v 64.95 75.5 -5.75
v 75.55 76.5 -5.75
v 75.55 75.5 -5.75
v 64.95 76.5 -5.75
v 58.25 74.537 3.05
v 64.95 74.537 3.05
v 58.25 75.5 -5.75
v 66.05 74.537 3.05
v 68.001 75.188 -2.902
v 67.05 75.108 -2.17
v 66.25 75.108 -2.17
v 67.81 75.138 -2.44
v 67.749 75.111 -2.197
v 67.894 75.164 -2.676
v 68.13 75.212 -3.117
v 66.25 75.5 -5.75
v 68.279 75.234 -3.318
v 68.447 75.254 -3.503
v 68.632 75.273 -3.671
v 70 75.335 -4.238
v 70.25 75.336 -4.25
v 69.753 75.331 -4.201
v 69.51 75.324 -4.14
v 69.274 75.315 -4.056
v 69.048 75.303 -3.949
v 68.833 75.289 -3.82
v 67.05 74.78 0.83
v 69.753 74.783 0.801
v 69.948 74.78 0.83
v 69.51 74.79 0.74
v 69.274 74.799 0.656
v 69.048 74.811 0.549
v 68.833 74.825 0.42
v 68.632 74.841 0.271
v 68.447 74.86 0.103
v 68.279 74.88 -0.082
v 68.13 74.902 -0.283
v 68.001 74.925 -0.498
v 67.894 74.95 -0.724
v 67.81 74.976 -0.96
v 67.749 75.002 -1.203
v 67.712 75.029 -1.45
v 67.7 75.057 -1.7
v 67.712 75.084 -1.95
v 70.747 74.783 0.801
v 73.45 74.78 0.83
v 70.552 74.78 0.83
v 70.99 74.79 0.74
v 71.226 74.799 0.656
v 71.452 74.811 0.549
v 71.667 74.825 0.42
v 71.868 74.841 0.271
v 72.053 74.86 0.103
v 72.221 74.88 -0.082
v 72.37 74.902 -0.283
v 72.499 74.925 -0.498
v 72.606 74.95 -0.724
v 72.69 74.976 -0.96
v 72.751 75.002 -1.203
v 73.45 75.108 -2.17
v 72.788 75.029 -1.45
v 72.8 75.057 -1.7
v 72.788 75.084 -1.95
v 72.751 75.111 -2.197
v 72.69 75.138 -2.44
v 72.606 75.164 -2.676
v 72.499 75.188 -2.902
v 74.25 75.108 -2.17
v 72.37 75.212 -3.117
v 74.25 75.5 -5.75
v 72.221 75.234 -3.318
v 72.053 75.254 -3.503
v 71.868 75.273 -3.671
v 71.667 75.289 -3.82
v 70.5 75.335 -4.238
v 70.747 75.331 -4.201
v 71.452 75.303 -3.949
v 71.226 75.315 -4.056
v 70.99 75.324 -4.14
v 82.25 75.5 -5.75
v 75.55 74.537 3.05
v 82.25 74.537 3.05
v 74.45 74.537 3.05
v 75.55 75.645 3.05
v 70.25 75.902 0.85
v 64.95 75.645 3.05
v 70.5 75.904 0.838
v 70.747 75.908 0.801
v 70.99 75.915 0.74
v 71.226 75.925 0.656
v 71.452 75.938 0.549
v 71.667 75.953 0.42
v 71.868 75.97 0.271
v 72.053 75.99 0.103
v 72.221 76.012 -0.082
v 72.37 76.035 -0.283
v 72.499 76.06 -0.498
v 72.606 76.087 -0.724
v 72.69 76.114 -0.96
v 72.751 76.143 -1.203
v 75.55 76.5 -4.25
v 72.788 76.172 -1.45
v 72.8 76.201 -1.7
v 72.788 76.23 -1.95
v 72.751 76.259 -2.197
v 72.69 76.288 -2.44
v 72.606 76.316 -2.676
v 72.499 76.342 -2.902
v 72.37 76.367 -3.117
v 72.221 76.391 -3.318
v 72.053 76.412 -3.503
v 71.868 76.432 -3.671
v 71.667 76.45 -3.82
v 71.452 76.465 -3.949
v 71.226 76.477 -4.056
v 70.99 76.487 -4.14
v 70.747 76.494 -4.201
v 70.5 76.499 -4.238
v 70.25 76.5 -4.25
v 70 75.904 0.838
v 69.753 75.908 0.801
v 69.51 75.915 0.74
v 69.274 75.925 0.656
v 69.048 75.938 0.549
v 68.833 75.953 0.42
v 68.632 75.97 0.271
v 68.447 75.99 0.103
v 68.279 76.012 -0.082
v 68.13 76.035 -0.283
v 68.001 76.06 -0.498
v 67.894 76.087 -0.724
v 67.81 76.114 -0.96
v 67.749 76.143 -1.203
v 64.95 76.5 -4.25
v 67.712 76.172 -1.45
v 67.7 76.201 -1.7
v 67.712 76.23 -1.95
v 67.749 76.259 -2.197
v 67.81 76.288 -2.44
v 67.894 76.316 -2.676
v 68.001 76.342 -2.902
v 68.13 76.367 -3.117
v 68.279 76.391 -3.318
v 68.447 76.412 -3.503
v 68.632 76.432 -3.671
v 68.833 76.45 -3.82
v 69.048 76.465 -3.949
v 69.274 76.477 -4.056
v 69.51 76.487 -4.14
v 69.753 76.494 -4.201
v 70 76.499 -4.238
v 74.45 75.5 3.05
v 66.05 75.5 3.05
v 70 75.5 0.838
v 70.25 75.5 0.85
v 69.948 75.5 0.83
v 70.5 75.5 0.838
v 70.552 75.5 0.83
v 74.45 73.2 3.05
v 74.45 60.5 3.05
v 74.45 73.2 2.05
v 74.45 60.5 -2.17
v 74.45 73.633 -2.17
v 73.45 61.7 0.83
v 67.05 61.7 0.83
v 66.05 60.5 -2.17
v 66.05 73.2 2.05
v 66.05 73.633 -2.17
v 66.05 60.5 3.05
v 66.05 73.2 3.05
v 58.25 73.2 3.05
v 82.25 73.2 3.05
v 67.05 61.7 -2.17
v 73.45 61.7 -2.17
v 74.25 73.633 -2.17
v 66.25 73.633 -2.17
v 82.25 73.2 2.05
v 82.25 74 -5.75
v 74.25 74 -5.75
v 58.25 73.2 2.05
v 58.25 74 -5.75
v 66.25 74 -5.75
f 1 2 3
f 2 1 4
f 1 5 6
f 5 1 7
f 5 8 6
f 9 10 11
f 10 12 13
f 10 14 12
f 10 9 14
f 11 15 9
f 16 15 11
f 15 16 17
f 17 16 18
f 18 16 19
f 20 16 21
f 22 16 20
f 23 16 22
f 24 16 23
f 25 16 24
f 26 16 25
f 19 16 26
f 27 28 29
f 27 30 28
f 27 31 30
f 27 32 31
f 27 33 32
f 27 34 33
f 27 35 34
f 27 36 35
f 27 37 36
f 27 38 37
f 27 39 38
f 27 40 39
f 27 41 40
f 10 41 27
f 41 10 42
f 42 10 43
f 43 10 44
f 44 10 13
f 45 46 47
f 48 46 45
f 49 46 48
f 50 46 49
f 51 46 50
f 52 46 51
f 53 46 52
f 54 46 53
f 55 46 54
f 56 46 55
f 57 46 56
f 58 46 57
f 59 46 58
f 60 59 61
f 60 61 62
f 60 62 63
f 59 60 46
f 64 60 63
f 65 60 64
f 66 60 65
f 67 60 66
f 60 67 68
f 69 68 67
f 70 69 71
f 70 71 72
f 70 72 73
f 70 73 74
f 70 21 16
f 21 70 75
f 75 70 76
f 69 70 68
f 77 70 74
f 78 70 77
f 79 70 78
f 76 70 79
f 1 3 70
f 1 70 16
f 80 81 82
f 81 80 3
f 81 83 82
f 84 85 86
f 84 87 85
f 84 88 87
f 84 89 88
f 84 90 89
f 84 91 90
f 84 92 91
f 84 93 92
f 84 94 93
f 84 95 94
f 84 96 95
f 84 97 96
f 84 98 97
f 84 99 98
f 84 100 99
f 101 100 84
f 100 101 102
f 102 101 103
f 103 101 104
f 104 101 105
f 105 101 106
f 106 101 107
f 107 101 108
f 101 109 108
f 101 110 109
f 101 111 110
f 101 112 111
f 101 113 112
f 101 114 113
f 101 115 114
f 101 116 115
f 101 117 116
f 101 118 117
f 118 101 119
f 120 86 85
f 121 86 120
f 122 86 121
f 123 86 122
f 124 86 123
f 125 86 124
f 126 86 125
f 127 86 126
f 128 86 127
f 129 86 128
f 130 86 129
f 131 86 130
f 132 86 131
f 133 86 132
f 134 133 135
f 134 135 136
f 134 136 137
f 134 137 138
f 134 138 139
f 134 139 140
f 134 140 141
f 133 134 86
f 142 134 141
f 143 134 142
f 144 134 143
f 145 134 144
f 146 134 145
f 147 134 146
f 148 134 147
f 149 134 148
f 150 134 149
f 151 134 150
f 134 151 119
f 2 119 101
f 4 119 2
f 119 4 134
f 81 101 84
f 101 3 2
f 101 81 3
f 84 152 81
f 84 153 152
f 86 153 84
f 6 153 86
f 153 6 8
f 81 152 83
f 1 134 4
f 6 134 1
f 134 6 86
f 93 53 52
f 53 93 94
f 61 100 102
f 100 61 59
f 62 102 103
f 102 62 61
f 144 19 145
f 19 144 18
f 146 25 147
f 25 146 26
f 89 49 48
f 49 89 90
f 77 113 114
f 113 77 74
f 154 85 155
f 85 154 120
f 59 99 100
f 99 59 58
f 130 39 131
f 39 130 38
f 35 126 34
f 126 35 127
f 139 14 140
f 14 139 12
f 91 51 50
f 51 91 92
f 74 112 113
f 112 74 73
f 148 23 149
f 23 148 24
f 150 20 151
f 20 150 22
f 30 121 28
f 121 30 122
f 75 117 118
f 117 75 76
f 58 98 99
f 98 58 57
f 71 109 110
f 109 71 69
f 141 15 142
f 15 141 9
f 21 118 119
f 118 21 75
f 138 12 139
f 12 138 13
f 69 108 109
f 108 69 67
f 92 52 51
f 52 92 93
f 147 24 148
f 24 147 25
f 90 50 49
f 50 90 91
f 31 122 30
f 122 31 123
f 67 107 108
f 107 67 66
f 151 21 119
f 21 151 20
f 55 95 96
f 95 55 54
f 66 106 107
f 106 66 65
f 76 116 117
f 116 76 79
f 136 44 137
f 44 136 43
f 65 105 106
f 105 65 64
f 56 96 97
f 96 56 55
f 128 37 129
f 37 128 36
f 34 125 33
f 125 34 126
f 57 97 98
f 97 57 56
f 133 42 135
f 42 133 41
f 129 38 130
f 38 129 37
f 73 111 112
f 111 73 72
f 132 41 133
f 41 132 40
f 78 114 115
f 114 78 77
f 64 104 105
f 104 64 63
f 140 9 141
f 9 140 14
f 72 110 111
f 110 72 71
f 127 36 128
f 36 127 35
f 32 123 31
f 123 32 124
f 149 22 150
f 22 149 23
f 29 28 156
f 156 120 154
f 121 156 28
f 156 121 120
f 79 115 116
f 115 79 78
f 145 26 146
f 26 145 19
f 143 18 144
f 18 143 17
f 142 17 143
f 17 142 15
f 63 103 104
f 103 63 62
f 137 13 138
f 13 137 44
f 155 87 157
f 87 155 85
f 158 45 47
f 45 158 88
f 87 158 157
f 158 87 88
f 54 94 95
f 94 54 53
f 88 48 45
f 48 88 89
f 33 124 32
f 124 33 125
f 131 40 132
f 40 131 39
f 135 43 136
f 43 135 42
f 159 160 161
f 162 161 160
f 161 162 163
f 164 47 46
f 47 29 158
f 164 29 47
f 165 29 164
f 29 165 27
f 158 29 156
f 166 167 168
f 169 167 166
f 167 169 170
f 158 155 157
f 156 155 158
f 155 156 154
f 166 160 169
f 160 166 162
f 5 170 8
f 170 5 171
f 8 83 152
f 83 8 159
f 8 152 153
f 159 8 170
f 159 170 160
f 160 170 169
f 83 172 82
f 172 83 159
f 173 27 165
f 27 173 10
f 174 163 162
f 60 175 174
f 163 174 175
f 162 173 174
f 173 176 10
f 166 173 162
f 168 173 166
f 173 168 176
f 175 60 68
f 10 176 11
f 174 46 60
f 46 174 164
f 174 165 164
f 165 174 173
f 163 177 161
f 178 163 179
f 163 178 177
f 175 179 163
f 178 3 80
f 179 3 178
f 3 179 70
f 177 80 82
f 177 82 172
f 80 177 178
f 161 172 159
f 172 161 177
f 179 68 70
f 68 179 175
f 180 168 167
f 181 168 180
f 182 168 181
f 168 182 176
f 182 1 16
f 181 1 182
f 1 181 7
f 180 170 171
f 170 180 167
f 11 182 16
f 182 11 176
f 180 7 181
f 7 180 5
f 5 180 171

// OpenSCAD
kw=13.92; // size of hole for switch x
kd=14.42; // size of hole for switch y
sepx=19; // x spacing between the switches
sepy=20.6; // y spacing between the switches
th=1.5; // thickness of top
bth=1; // bottom thickness
gap=1.5; // x width of bits between keys

fingers = [0,0,15,24,19,19,19]; // controls y adjustment of columns
thumbs = [0,0,0,0,0,0,0];
dips = [0,0,0,1,1,0,0]; // controls z adjustment of columns
fronty=-33.5;  // y position of front
reary=76;      // y position of rear
supports = [fronty,-10,10,30,76];
edgex=2;


module rotate_about_xy(x, y, pt) {
  translate(pt)
    rotate([x, y, 0])
      translate(-pt)
        children();
}  

module rotate_about_z(z, pt) {
  translate(pt)
    rotate([0, 0, z])
      translate(-pt)
        children();
}  
module rotate_about_xy_off(x, y, pt,off) {
  translate(pt+off)
    rotate([x, y, 0])
      translate(-pt)
        children();
}  

bigR = 77;  // controls the radius of the curvature of the top. higher is less curve
rx = 2*asin(sepy/(2*bigR));
ry = 2*asin(sepx/(2*bigR));

// top plate

cubex=0.01;
cube2=cubex/2;
cubey=0.1;
vth=0.8;
baseline = -5; // controls where the bottom is and therefore overall height
frontdip=5; // height of bit at the front. higher numbers makes it lower
reardip=4;  // same at back
screw=6.1;

rotation_point = [0,0,bigR];
rot2 = 5; // how much the top is tilted forward
rot_point2 = [0,-30,2.7]; // the point forward tilt is around


module elitec() {
  color("green")cube([18.5,33.25,1.00],true);
//  color("silver")translate([0,(33.25/2)-(7.35/2)+0.65,1.65+0.5]) cube([9,7.35,3.3],true);
  color("silver") translate([0,(33.25/2)+0.65,1.65+0.5])
  difference() {
    hull() {
      translate([2.85,0,0]) rotate([90,0,0]) cylinder(d1=3.3,d2=3.3,h=7.35,$fn=32);
      translate([-2.85,0,0]) rotate([90,0,0]) cylinder(d1=3.3,d2=3.3,h=7.35,$fn=32);
    }
    hull() {
      translate([2.85,1,0]) rotate([90,0,0]) cylinder(d1=2.9,d2=2.9,h=7.35,$fn=32);
      translate([-2.85,1,0]) rotate([90,0,0]) cylinder(d1=2.9,d2=2.9,h=7.35,$fn=32);
    }
  }
  color("gray") translate([0,-2,1]) cube([8,8,1],true);
}

module elitec4() {
  difference() {
    color("green")translate([0,0,0.33]) cube([18.5,33.25,1.66],true);
    translate([0,13.13,0]) cube([9,7,1.67],true);
   
  }
//  color("silver")translate([0,(33.25/2)-(7.35/2)+0.65,1.65+0.5]) cube([9,7.35,3.3],true);
  color("silver") translate([0,(33.25/2)+0.65,1.16])
  difference() {
    hull() {
      translate([2.85,0,0]) rotate([90,0,0]) cylinder(d1=3.3,d2=3.3,h=7.35,$fn=32);
      translate([-2.85,0,0]) rotate([90,0,0]) cylinder(d1=3.3,d2=3.3,h=7.35,$fn=32);
    }
    hull() {
      translate([2.85,1,0]) rotate([90,0,0]) cylinder(d1=2.9,d2=2.9,h=7.35,$fn=32);
      translate([-2.85,1,0]) rotate([90,0,0]) cylinder(d1=2.9,d2=2.9,h=7.35,$fn=32);
    }
  }
  color("gray") translate([0,-2,1]) cube([8,8,1],true);
 
}

module pro_micro_caddy() {
  difference() {
    intersection() {
      color("limegreen")hull() {
       // top left
       translate([-10,fingers[3]+3,-dips[3]-reardip]) rotate_about_xy(rot2,0,rot_point2) rotate_about_xy(rx*3-rx/2,0,rotation_point) cube([cubex, cubey, th],true);
       // top right
       translate([30,fingers[3]+3,-dips[3]-reardip]) rotate_about_xy(rot2,0,rot_point2) rotate_about_xy(rx*3-rx/2,0,rotation_point) cube([cubex, cubey, th],true);
       // bottom left
       translate([-10,reary,baseline]) cube([cubex, 1, th],true);
       // bottom right
       translate([30,reary,baseline]) cube([cubex, 1, th],true);
     }
     translate([10,17.2+58+1,-3.5+1.75-0.2]) cube([20.7,5,10],true); // back plate
   }
   // hole for usb cable plug
    translate([10,78,-2.95]) hull() {
      translate([2.85,0,0]) rotate([90,0,0]) cylinder(d1=3.7,d2=3.7,h=7.35,$fn=32);
      translate([-2.85,0,0]) rotate([90,0,0]) cylinder(d1=3.7,d2=3.7,h=7.35,$fn=32);
    }
    // spacing for usb cable around the plug
    color("teal")translate([10,79,-2.95])rotate([90,90,0]) hull() {
      translate([0,2.95,0])cylinder(d1=7.3,d2=7.3,h=3,$fn=64);
      translate([0,-2.95,0])cylinder(d1=7.3,d2=7.3,h=3,$fn=64);
    }
  }
 
  // bit to glue caddy to case
  difference() {
    union() {
      hull() {
        translate([-4,75,-5.25]) cube([9,2,1],true);
        translate([-4,74,2.55]) cube([9,2,1],true);
      }
      hull() {
        translate([24,75,-5.25]) cube([9,2,1],true);
        translate([24,74,2.55]) cube([9,2,1],true);
      }
      translate([10,58,0.25]) {
        difference() {
          union() {
            translate([0,-0.4,1])color("lightblue")cube([21,34.8,1.00],true); // base
            translate([0,-0.4,2])color("lightcoral")cube([21,34.8,1.6],true); // base
          }
          translate([8,-0.4,0]) cube([3,32.8,3], true);
          translate([-8,-0.4,0]) cube([3,32.8,3], true);
          translate([0,-15.3,0]) cube([13.1,3,3], true);
        }
       
        // short walls
        color("orange")translate([10,0,-1]) cube([1,34,3],true);
        color("orange")translate([-10,0,-1]) cube([1,34,3],true);
        color("orange")translate([0,-17.3,-1]) cube([21,1,3],true);
      }
    }
    hull() {
       // top left
       translate([-10,fingers[3]+3,-dips[3]-reardip]) rotate_about_xy(rot2,0,rot_point2) rotate_about_xy(rx*3-rx/2,0,rotation_point) cube([cubex, cubey, th],true);
       // top right
       translate([30,fingers[3]+3,-dips[3]-reardip]) rotate_about_xy(rot2,0,rot_point2) rotate_about_xy(rx*3-rx/2,0,rotation_point) cube([cubex, cubey, th],true);
       // bottom left
       translate([-10,reary,baseline]) cube([cubex, 1, th],true);
       // bottom right
       translate([30,reary,baseline]) cube([cubex, 1, th],true);
     }
  }
}

// caddy to hold the elite c v4
module caddy1_v4() {
  difference() {
    intersection() {
      color("limegreen")hull() {
       // top left
       translate([-10,fingers[3]+3,-dips[3]-reardip]) rotate_about_xy(rot2,0,rot_point2) rotate_about_xy(rx*3-rx/2,0,rotation_point) cube([cubex, cubey, th],true);
       // top right
       translate([30,fingers[3]+3,-dips[3]-reardip]) rotate_about_xy(rot2,0,rot_point2) rotate_about_xy(rx*3-rx/2,0,rotation_point) cube([cubex, cubey, th],true);
       // bottom left
       translate([-10,reary,baseline]) cube([cubex, 1, th],true);
       // bottom right
       translate([30,reary,baseline]) cube([cubex, 1, th],true);
     }
     translate([10,17.2+58+1,-3.5+1.75-0.2]) cube([20.7,5,10],true); // back plate
   }
   // hole for usb cable plug
    translate([10,78,-1.95]) hull() {
      translate([2.85,0,0]) rotate([90,0,0]) cylinder(d1=3.7,d2=3.7,h=7.35,$fn=32);
      translate([-2.85,0,0]) rotate([90,0,0]) cylinder(d1=3.7,d2=3.7,h=7.35,$fn=32);
    }
    color("teal")translate([10,79,-1.95])rotate([90,90,0]) hull() {
      translate([0,2.95,0])cylinder(d1=7.3,d2=7.3,h=3,$fn=64);
      translate([0,-2.95,0])cylinder(d1=7.3,d2=7.3,h=3,$fn=64);
    }
  }
 
  // bit to glue caddy to case
  difference() {
    union() {
      //translate([24.5,74.6,-1.35]) rotate([5,0,0]) cube([10,2,9],true);
      //translate([-4,74.6,-1.35]) rotate([5,0,0]) cube([9,2,9],true);
      hull() {
        translate([-4,75,-5.25]) cube([9,2,1],true);
        translate([-4,74,2.55]) cube([9,2,1],true);
      }
      hull() {
        translate([24,75,-5.25]) cube([9,2,1],true);
        translate([24,74,2.55]) cube([9,2,1],true);
      }
      translate([10,58,-0.75]) {
        difference() {
          union() {
            translate([0,-0.4,1])color("lightblue")cube([21,34.8,1.00],true); // base
            translate([0,-0.4,2.65])color("lightcoral")cube([21,34.8,2.3],true); // base
          }
          translate([8,-0.4,0]) cube([3,32.8,3], true);
          translate([-8,-0.4,0]) cube([3,32.8,3], true);
          translate([0,-15.3,0]) cube([13.1,3,3], true);
        }
        // short walls
        color("orange")translate([10,0,-1]) cube([1,34,3],true);
        color("orange")translate([-10,0,-1]) cube([1,34,3],true);
        color("orange")translate([0,-17.3,-1]) cube([21,1,3],true);
      }
    }
    // backplate
    hull() {
       // top left
       translate([-10,fingers[3]+3,-dips[3]-reardip]) rotate_about_xy(rot2,0,rot_point2) rotate_about_xy(rx*3-rx/2,0,rotation_point) cube([cubex, cubey, th],true);
       // top right
       translate([30,fingers[3]+3,-dips[3]-reardip]) rotate_about_xy(rot2,0,rot_point2) rotate_about_xy(rx*3-rx/2,0,rotation_point) cube([cubex, cubey, th],true);
       // bottom left
       translate([-10,reary,baseline]) cube([cubex, 1, th],true);
       // bottom right
       translate([30,reary,baseline]) cube([cubex, 1, th],true);
     }
   
  }
}

// caddy for the trrs jack
module jack_caddy() {
  holex = 4.75*sepx-20;
  difference() {
    intersection() {
      color("seagreen")
      hull() {
        // top left
        translate([holex-8,fingers[3]+3,-dips[3]-reardip]) rotate_about_xy(rot2,0,rot_point2) rotate_about_xy(rx*3-rx/2,0,rotation_point) cube([cubex, cubey, th],true);
        // top right
        translate([holex+8,fingers[3]+3,-dips[3]-reardip]) rotate_about_xy(rot2,0,rot_point2) rotate_about_xy(rx*3-rx/2,0,rotation_point) cube([cubex, cubey, th],true);
        // bottom left
        translate([holex-8,reary,baseline]) cube([cubex, 1, th],true);
        // bottom right
        translate([holex+8,reary,baseline]) cube([cubex, 1, th],true);
      }
      translate([holex,17.2+58+1,-3.5+1.75-0.7]) cube([10.6,5,11],true); // back plate
    }
    translate([holex,78,-1.7]) rotate([90,0,0]) cylinder(d1=5.1,d2=5.1,h=4,$fn=64);
  }

  translate([holex,68,1.33]) {
    union(){
      color("orange") cube([8.4,15,1],true);
      color("skyblue") translate([0,0,1.1])cube([8.4,15,1.24],true);
      translate([-3.7,0,-1.5])cube([1,15,4],true);
      translate([3.7,0,-1.5])cube([1,15,4],true);
      translate([0,-6.9,-1.5])cube([8,1.2,4],true);
    }
  }
  difference(){
    union(){
      translate([holex,68,1.33]) {
        hull() {
          translate([8,6.2,-2.78+4]) cube([8,2,1],true);
          translate([8,7,baseline-1.58]) cube([8,2,1],true);
        }
        hull() {
          translate([-8,6.2,-2.78+4]) cube([8,2,1],true);
          translate([-8,7,baseline-1.58]) cube([8,2,1],true);
        }
      }
    }
    hull() {
      // top left
      translate([holex-16,fingers[3]+3,-dips[3]-reardip]) rotate_about_xy(rot2,0,rot_point2) rotate_about_xy(rx*3-rx/2,0,rotation_point) cube([cubex, cubey, th],true);
      // top right
      translate([holex+16,fingers[3]+3,-dips[3]-reardip]) rotate_about_xy(rot2,0,rot_point2) rotate_about_xy(rx*3-rx/2,0,rotation_point) cube([cubex, cubey, th],true);
      // bottom left
      translate([holex-16,reary,baseline]) cube([cubex, 1, th],true);
      // bottom right
      translate([holex+16,reary,baseline]) cube([cubex, 1, th],true);
    }
  }
 
}

// TRRS jack
module jack() {
  color("darkgray")
  translate([4.75*sepx-20,68,-1.7]) {
    rotate([-90,0,0]){
      difference() {
        union(){
          translate([0,0,6])cylinder(d1=5,d2=5,h=2,$fn=64);
          cube([6.25, 5.1, 12.2],true);
        }
        translate([0,0,-6]) cylinder(d1=3.5,d2=3.5,h=19,$fn=64);
      }
    }
  }
 
}


module usbc() {
  color("gray")hull() {
    // 12.6mm x 6.7
    translate([0,2.95,0])cylinder(d1=6.7,d2=6.7,h=24.5,$fn=64);
    translate([0,-2.95,0])cylinder(d1=6.7,d2=6.7,h=24.5,$fn=64);
  }
  color("silver")
  difference(){
    hull() {
    //2.5 x 8.3
      translate([0,2.9,24.5])cylinder(d1=2.5,d2=2.5,h=6.5,$fn=32);
      translate([0,-2.9,24.5])cylinder(d1=2.5,d2=2.5,h=6.5,$fn=32);
    }
    hull() {
      translate([0,2.9,24.5])cylinder(d1=2.2,d2=2.2,h=6.7,$fn=32);
      translate([0,-2.9,24.5])cylinder(d1=2.2,d2=2.2,h=6.7,$fn=32);
    }
  }
}
//translate([0,43.3,2]) rotate([90,90,0]) usbc();

module bolt(x,y) {
  boltx = 5.55;
  difference() {
    translate([x,y,baseline+1.5]) cube([8,7,4.5],true);
    //translate([x,y,baseline+4.8]) rotate([0,0,30]) color("red")import("C:/Users/Chris/Downloads/Metric_nuts_and_screws/files/hex_negative_m3.stl");
    for(i = [0:2]) {
      translate([x,y,baseline+4.8]) rotate([0,0,60*i+30])cube([boltx, tan(30)*boltx, 5],true);
    }
   
    translate([x,y,baseline-th]) cylinder(d1=3.2,d2=3.2,h=10,$fn=64);
  }

}

module m3screw(x,y) {
  translate([x,y,-6.9])
  difference() {
    union() {
      cylinder(d1=3, d2=3, h=6,$fn=64);
      cylinder(d1=5.9,d2=3,h=2,$fn=64);
    }
    cylinder(d1=2,d2=2,h=1,$fn=6);
  }
}
module m3screws() {
  m3screw(-sepx+4.9,fronty+4.2);
  //bolt(6*sepx-4.9,fronty+4.2);
 
  m3screw(-sepx+4.9,reary-4.2);
  m3screw(6*sepx-4.9,reary-4.2);
 
  m3screw(1.5*sepx,fronty+4.3);
  m3screw(3.5*sepx,reary-4.2);
  m3screw(6*sepx-4.9,-5);
 
  m3screw(-sepx+4.9,27);
 
}

module bolts() {
  bolt(-sepx+4.9,fronty+4.2);
  //bolt(6*sepx-4.9,fronty+4.2);
 
  bolt(-sepx+4.9,reary-4.2);
  bolt(5*sepx-4.9,reary-4.2);
 
  //bolt(1.5*sepx,fronty+4.3);
  bolt(2*sepx,reary-4.2);
  bolt(5*sepx-4.9,-7);
 
  bolt(-sepx+4.9,27);
}


module keycaps() {
 
  union() {
   
    for(n = [-1:2]) {
      for(m = [0:5]) {
        translate([m*sepx-sepx/2,fingers[m],-dips[m]])
           rotate_about_xy(rot2,0,rot_point2)
           rotate_about_xy(n*rx,0,[0,0,bigR])
             translate([0,0,10])rotate([90,0,0])import("C:/Users/Chris/Documents/DSA 1u.stl");
      }
    }
    for(m = [3:5]){
      translate([m*sepx-sepx/2,-2*sepy+thumbs[m],0])
        rotate_about_xy(rx,0,rotation_point)
          translate([0,0,10])rotate([90,0,0])import("C:/Users/Chris/Documents/DSA 1u.stl");
    }
  }
}

module top() {
//mirror(v=[1,0,0])
difference() {
union() {
  // 4 x 6 finger keys
  for (m = [0:5]) { // across the fingers
    p = m-1;
    for(n = [-1:2]){ // keyboard rows
      difference() {
        color("orange")hull() {
          left=m==0?-edgex:0;
          right=m==5?edgex:0;
          // back right
          translate([m*sepx-gap+right,fingers[m],-dips[m]]) rotate_about_xy(rot2,0,rot_point2) rotate_about_xy(rx*n+rx/2,0,rotation_point) cube([cubex, cubey, th],true);
          // front right
          translate([m*sepx-gap+right,fingers[m],-dips[m]]) rotate_about_xy(rot2,0,rot_point2)rotate_about_xy(rx*n-rx/2,0,rotation_point) cube([cubex, cubey, th],true);
          // back left
          translate([(m-1)*sepx+gap+left,fingers[m],-dips[m]]) rotate_about_xy(rot2,0,rot_point2)rotate_about_xy(rx*n+rx/2,0,rotation_point) cube([cubex, cubey, th],true);
          // front left
          translate([(m-1)*sepx+gap+left,fingers[m],-dips[m]]) rotate_about_xy(rot2,0,rot_point2)rotate_about_xy(rx*n-rx/2,0,rotation_point) cube([cubex, cubey, th],true);
        }
        if(m<6) { // cut out hole for keycap
          translate([m*sepx-sepx/2,fingers[m],-dips[m]])rotate_about_xy(rot2,0,rot_point2)rotate_about_xy(n*rx,0,rotation_point) cube([kw,kd,5],true);
        }
      }
      // vertical supports that go in the Y direction
      // that sit on the right side of the key plates
      if(m>4)
      color("wheat")hull() {
        // two bits on the underside of the keyboard plate
        translate([m*sepx-gap-vth+edgex,fingers[m],-dips[m]]) rotate_about_xy(rot2,0,rot_point2) rotate_about_xy_off(rx*n+rx/2,0,rotation_point,[0,0,-1]) cube([2*vth, cubey, th],true);
        translate([m*sepx-gap-vth+edgex,fingers[m],-dips[m]]) rotate_about_xy(rot2,0,rot_point2) rotate_about_xy_off(rx*n-rx/2,0,rotation_point,[0,0,-1]) cube([2*vth, cubey, th],true);
        // two vertices on the floor                for thicker walls vvvvv
        translate([m*sepx-gap-vth+edgex,supports[n+1],baseline])cube([2*vth, cubey, th],true);
        translate([m*sepx-gap-vth+edgex,supports[n+2],baseline])cube([2*vth, cubey, th],true);
      }
      // that sit on the left side of the key plates
      if (m<1)
      color("wheat") hull() { //
        // two bits on the underside of the keyboard plate
        translate([(m-1)*sepx+gap+vth-edgex,fingers[m],-dips[m]]) rotate_about_xy(rot2,0,rot_point2)rotate_about_xy_off(rx*n+rx/2,0,rotation_point,[0,0,-1]) cube([2*vth, cubey, th],true);
        translate([(m-1)*sepx+gap+vth-edgex,fingers[m],-dips[m]]) rotate_about_xy(rot2,0,rot_point2)rotate_about_xy_off(rx*n-rx/2,0,rotation_point,[0,0,-1]) cube([2*vth, cubey, th],true);
        // two vertices on the floor
        translate([(m-1)*sepx+gap+vth-edgex,supports[n+1],baseline])cube([2*vth, cubey, th],true);
        translate([(m-1)*sepx+gap+vth-edgex,supports[n+2],baseline])cube([2*vth, cubey, th],true);
      }


    }
  }

 
  for (m = [4:5]) {
    // thumb keys
    difference(){
     color("plum")hull() {
       left=m==0?-edgex:0;
       right=m==5?edgex:0;
       // top right
       translate([m*sepx-gap+right,-2*sepy+thumbs[m],0]) rotate_about_xy(rx+rx/2,0,rotation_point) cube([cubex, cubey, th],true);
       // bottom right
       translate([m*sepx-gap+right,-2*sepy+thumbs[m],0]) rotate_about_xy(rx-rx/2,0,rotation_point) cube([cubex, cubey, th],true);
       // top left
       translate([(m-1)*sepx+gap+left,-2*sepy+thumbs[m],0]) rotate_about_xy(rx+rx/2,0,rotation_point) cube([cubex, cubey, th],true);
       // bottom left
       translate([(m-1)*sepx+gap+left,-2*sepy+thumbs[m],0]) rotate_about_xy(rx-rx/2,0,rotation_point) cube([cubex, cubey, th],true);
     }
     // key hole
     translate([m*sepx-sepx/2,-2*sepy+thumbs[m],0]) rotate_about_xy(rx,0,rotation_point) cube([kw,kd,5],true);
    }
    // bits to join front of thumb keys to front line
    color("salmon")hull() {
       left=m==0?-edgex:0;
       right=m==5?edgex:0;
    // from plate
    // bottom right
    translate([m*sepx-gap+right,-2*sepy+thumbs[m],0]) rotate_about_xy(rx-rx/2,0,rotation_point) cube([cubex, cubey, th],true);
    // bottom left
    translate([(m-1)*sepx+gap+left,-2*sepy+thumbs[m],0]) rotate_about_xy(rx-rx/2,0,rotation_point) cube([cubex, cubey, th],true);
    // to line
    translate([(m-1)*sepx+gap+left,fingers[0]-3,-dips[3]-frontdip]) rotate_about_xy(rx*n-rx/2,0,rotation_point) cube([cubex, 1, th],true);
    translate([m*sepx-gap+right,fingers[0]-3,-dips[3]-frontdip]) rotate_about_xy(rx*n-rx/2,0,rotation_point) cube([cubex, 1, th],true);
   }
  }
  // bit to join left most thumb key to front bit of middle finger column
  for(m=[4:5]) {
   color("red")hull() {
      // back right
      translate([(m-1)*sepx+gap-cube2,-2*sepy+thumbs[m],0]) rotate_about_xy(rx+rx/2,0,rotation_point) cube([cubex, cubey, th],true);
      // front right
      translate([(m-1)*sepx+gap-cube2,-2*sepy+thumbs[m],0]) rotate_about_xy(rx-rx/2,0,rotation_point) cube([cubex, cubey, th],true);
      // mid left
      translate([(m-1)*sepx-gap+cube2,fingers[m-1],-dips[m-1]]) rotate_about_xy(rot2,0,rot_point2) rotate_about_xy(rx*n-rx/2,0,rotation_point) cube([cubex, cubey, th],true);
      // front left
      translate([(m-1)*sepx-gap+cube2,fingers[0]-3,-dips[3]-frontdip]) rotate_about_xy(rx*n-rx/2,0,rotation_point) cube([cubex, 1, th],true);
   }
   
   color("firebrick")hull() {
      // front left
      translate([(m-1)*sepx-gap+cube2,fingers[0]-3,-dips[3]-frontdip]) rotate_about_xy(rx*n-rx/2,0,rotation_point) cube([cubex, 1, th],true);
     // front right
     translate([(m-1)*sepx+gap-cube2,fingers[0]-3,-dips[3]-frontdip]) rotate_about_xy(rx*n-rx/2,0,rotation_point) cube([cubex, 1, th],true);
     // mid right
      translate([(m-1)*sepx+gap,-2*sepy+thumbs[m],0]) rotate_about_xy(rx-rx/2,0,rotation_point) cube([cubex, cubey, th],true);
   }
    // bit to fill a triangle hole between leftmost thumb, bottom row middle finger, & bottom row ring finger
   color("maroon")hull(){
     // back right
     translate([(m-1)*sepx+gap,fingers[m],-dips[m]]) rotate_about_xy(rot2,0,rot_point2)rotate_about_xy(rx*n-rx/2,0,rotation_point) cube([cubex, cubey, th],true);      
     // front left
      translate([(m-1)*sepx-gap,fingers[m-1],-dips[m-1]])rotate_about_xy(rot2,0,rot_point2)rotate_about_xy(rx*n-rx/2,0,rotation_point) cube([cubex, cubey, th],true);
     // mid right
      translate([(m-1)*sepx+gap,-2*sepy+thumbs[m],0]) rotate_about_xy(rx+rx/2,0,rotation_point) cube([cubex, cubey, th],true);
   }
  }
  for(m=[4:5]){
    // thumb vertical supports
    if(m>4)
     color("limegreen")hull() {
         left=m==0?-edgex:0;
         right=m==5?edgex:0;
       // top                                                                           2*vth for thicker walls vvvvv
       translate([m*sepx-gap-vth+right,-2*sepy+thumbs[m],-0.3]) rotate_about_xy(rx+rx/2,0,rotation_point) cube([2*vth, cubey, 0.1],true);
       translate([m*sepx-gap-vth+right,-2*sepy+thumbs[m],-0.3]) rotate_about_xy(rx-rx/2,0,rotation_point) cube([2*vth, cubey, 0.1],true);
       // floor
       translate([m*sepx-gap-vth+right,fronty,baseline])cube([2*vth, cubey, th],true);
       translate([m*sepx-gap-vth+right,-5,baseline])cube([2*vth, cubey, th],true);
       // front
       translate([m*sepx-gap-vth+right,fingers[0]-3,-dips[3]-frontdip]) rotate_about_xy(rx*n-rx/2,0,rotation_point) cube([2*vth, 1, 0.1],true);
     }

  }
  // connecting front line to baseline
  for(m=[0:5]) {
    color("lightpink")hull() {
     left=m==0?-edgex:0;
     right=m==5?edgex:0;
      // left
      translate([(m-1)*sepx+gap+left,fingers[0]-3,-dips[3]-frontdip]) rotate_about_xy(rx*n-rx/2,0,rotation_point) cube([cubex, 1, th],true);
      translate([(m-1)*sepx+gap+left,fronty,baseline]) cube([cubex, 1, th],true); // floor
      // right
      translate([m*sepx-gap+right,fingers[0]-3,-dips[3]-frontdip]) rotate_about_xy(rx*n-rx/2,0,rotation_point) cube([cubex, 1, th],true);
      translate([m*sepx-gap+right,fronty,baseline]) cube([cubex, 1, th],true); // floor
    }
    if(m<5) {
      color("PaleVioletRed")hull() {
      // left
      translate([m*sepx+gap,fingers[0]-3,-dips[3]-frontdip]) rotate_about_xy(rx*n-rx/2,0,rotation_point) cube([cubex, 1, th],true);
      translate([m*sepx+gap,fronty,baseline]) cube([cubex, 1, th],true); // floor
      // right
      translate([m*sepx-gap,fingers[0]-3,-dips[3]-frontdip]) rotate_about_xy(rx*n-rx/2,0,rotation_point) cube([cubex, 1, th],true);
      translate([m*sepx-gap,fronty,baseline]) cube([cubex, 1, th],true); // floor
      }
    }

    // vertical supports that go in the Y direction
    // that sit on the right side of the key plates
    // this bit joins the wheat vertical supports to the lightpink and palevioletred bit at the front
    for(n=[-1:-1]) {
      if(m>4)
      color("springgreen")hull() {
        right=m==5?edgex:0;
        // two bits on the underside of the keyboard plate
        // translate([(m-1)*sepx+gap+vth/2,fingers[m],-dips[m]]) rotate_about_xy(rot2,0,rot_point2)rotate_about_xy_off(rx*n+rx/2,0,rotation_point,[0,0,-1]) cube([vth, cubey, th],true);
        translate([m*sepx-gap-vth/2+right,fingers[m],-dips[m]]) rotate_about_xy(rot2,0,rot_point2)rotate_about_xy_off(rx*n-rx/2,0,rotation_point,[0,0,-1]) cube([vth, cubey, th],true);
        // two vertices on the floor
        translate([m*sepx-gap-vth/2+right,supports[n+1],baseline])cube([vth, cubey, th],true);
        // to line
        translate([m*sepx-gap-vth/2+right,fingers[0]-3,-dips[3]-frontdip]) rotate_about_xy(rx*n-rx/2,0,rotation_point) cube([vth, cubey, th],true);
      }
      // that sit on the left side of the key plates
      if(m<1)
      color("springgreen")hull() {
         left=m==0?-edgex:0;
        // two bits on the underside of the keyboard plate
        // translate([(m-1)*sepx+gap+vth/2,fingers[m],-dips[m]]) rotate_about_xy(rot2,0,rot_point2)rotate_about_xy_off(rx*n+rx/2,0,rotation_point,[0,0,-1]) cube([vth, cubey, th],true);
        translate([(m-1)*sepx+gap+vth+left,fingers[m],-dips[m]]) rotate_about_xy(rot2,0,rot_point2)rotate_about_xy_off(rx*n-rx/2,0,rotation_point,[0,0,-1]) cube([2*vth, cubey, th],true);
        // two vertices on the floor
        translate([(m-1)*sepx+gap+vth+left,fronty,baseline])cube([2*vth, cubey, th],true);
        // to line
        translate([(m-1)*sepx+gap+vth+left,fingers[0]-3,-dips[3]-frontdip]) rotate_about_xy(rx*n-rx/2,0,rotation_point) cube([2*vth, cubey, th],true);
      }
    }
  }
 
  //  bits between thumb keys
  for (m = [4:4]) {
   color("mediumorchid")hull() {
     // top left
     translate([m*sepx-gap+cube2,-2*sepy+thumbs[m],0]) rotate_about_xy(rx+rx/2,0,rotation_point) cube([cubex, cubey, th],true);
     // bottom left
     translate([m*sepx-gap+cube2,-2*sepy+thumbs[m],0]) rotate_about_xy(rx-rx/2,0,rotation_point) cube([cubex, cubey, th],true);
     // top right
     translate([m*sepx+gap-cube2,-2*sepy+thumbs[m],0]) rotate_about_xy(rx+rx/2,0,rotation_point) cube([cubex, cubey, th],true);
     // bottom right
     translate([m*sepx+gap-cube2,-2*sepy+thumbs[m],0]) rotate_about_xy(rx-rx/2,0,rotation_point) cube([cubex, cubey, th],true);
     //
   }
   hull() {
     // bottom right
     translate([m*sepx+gap-cube2,-2*sepy+thumbs[m],0]) rotate_about_xy(rx-rx/2,0,rotation_point) cube([cubex, cubey, th],true);
     // bottom left
     translate([m*sepx-gap+cube2,-2*sepy+thumbs[m],0]) rotate_about_xy(rx-rx/2,0,rotation_point) cube([cubex, cubey, th],true);
     // front right
     translate([m*sepx+gap-cube2,fingers[0]-3,-dips[3]-frontdip]) rotate_about_xy(rx*n-rx/2,0,rotation_point) cube([cubex, 1, th],true);
     // front left
     translate([m*sepx-gap+cube2,fingers[0]-3,-dips[3]-frontdip]) rotate_about_xy(rx*n-rx/2,0,rotation_point) cube([cubex, 1, th],true);
   }
  }
 
  // tiny little bit to join thumb inbetween bits with key inbetween bits
  n3=-1;
  for (m = [4:4]) {
    p = m+1;
   color("coral")hull() {
     // thumb
     translate([m*sepx-gap+cube2,-2*sepy+thumbs[m],0]) rotate_about_xy(rx+rx/2,0,rotation_point) cube([cubex, cubey, th],true);
     translate([m*sepx+gap-cube2,-2*sepy+thumbs[m],0]) rotate_about_xy(rx+rx/2,0,rotation_point) cube([cubex, cubey, th],true);
     // finger keys
     translate([m*sepx-gap+cube2,fingers[m],-dips[m]]) rotate_about_xy(rot2,0,rot_point2)rotate_about_xy(rx*n3-rx/2,0,rotation_point) cube([cubex, cubey, th],true);
     translate([m*sepx+gap-cube2,fingers[p],-dips[p]]) rotate_about_xy(rot2,0,rot_point2)rotate_about_xy(rx*n3-rx/2,0,rotation_point) cube([cubex, cubey, th],true);
   }
  }
 
 
  // joiners between keys
  for (m = [0:4]) { // across the fingers
    //m = 2;
    p = m+1;
    for(n = [-1:2]){ // keyboard rows
     color("hotpink")hull() {
       // top right
      translate([m*sepx-gap+cube2,fingers[m],-dips[m]]) rotate_about_xy(rot2,0,rot_point2) rotate_about_xy(rx*n+rx/2,0,rotation_point) cube([cubex, cubey, th],true);
       // bottom right
      translate([m*sepx-gap+cube2,fingers[m],-dips[m]]) rotate_about_xy(rot2,0,rot_point2) rotate_about_xy(rx*n-rx/2,0,rotation_point) cube([cubex, cubey, th],true);
       // top left
      translate([m*sepx+gap-cube2,fingers[p],-dips[p]]) rotate_about_xy(rot2,0,rot_point2) rotate_about_xy(rx*n+rx/2,0,rotation_point) cube([cubex, cubey, th],true);
       // bottom left
      translate([m*sepx+gap-cube2,fingers[p],-dips[p]]) rotate_about_xy(rot2,0,rot_point2) rotate_about_xy(rx*n-rx/2,0,rotation_point) cube([cubex, cubey, th],true);
     }
    }
  }
 
  // join front of keys to front line
  n = -1;
  left = 0;
  for(m = [0:3]) {
    p = m + 1;
   color("lightblue")hull() {
     left=m==0?-edgex:0;
     right=m==5?edgex:0;
   // from plate
     translate([(m-1)*sepx+gap+left,fingers[m],-dips[m]]) rotate_about_xy(rot2,0,rot_point2) rotate_about_xy(rx*n-rx/2,0,rotation_point) cube([cubex, cubey, th],true);
     translate([m*sepx-gap,fingers[m],-dips[m]]) rotate_about_xy(rot2,0,rot_point2) rotate_about_xy(rx*n-rx/2,0,rotation_point) cube([cubex, cubey, th],true);
   // to add thickness front to back with an added 0.5 here --------------------v
     translate([(m-1)*sepx+gap+left,fingers[m],-dips[m]]) rotate_about_xy(rx*n-rx/2+0.5,0,rotation_point) cube([cubex, cubey, th],true);
     translate([m*sepx-gap,fingers[m],-dips[m]]) rotate_about_xy(rx*n-rx/2+0.5,0,rotation_point) cube([cubex, cubey, th],true);
     // to line
     //left
     translate([(m-1)*sepx+gap+left,fingers[0]-3,-dips[3]-frontdip]) rotate_about_xy(rx*n-rx/2,0,rotation_point) cube([cubex, 1, th],true);
     // right
     translate([m*sepx-gap,fingers[0]-3,-dips[3]-frontdip]) rotate_about_xy(rx*n-rx/2,0,rotation_point) cube([cubex, 1, th],true);
     
   }
  // joiners between front bit  
    if(m<3){
   color("deepskyblue")hull() {
     // from plate
     translate([m*sepx-gap+cube2,fingers[m],-dips[m]]) rotate_about_xy(rot2,0,rot_point2) rotate_about_xy(rx*n-rx/2,0,rotation_point) cube([cubex, cubey, th],true);
     translate([m*sepx+gap-cube2,fingers[p],-dips[p]]) rotate_about_xy(rot2,0,rot_point2) rotate_about_xy(rx*n-rx/2,0,rotation_point) cube([cubex, cubey, th],true);
     // to add thickness front to back
     translate([m*sepx-gap+cube2,fingers[m],-dips[m]]) rotate_about_xy(rx*n-rx/2+0.5,0,rotation_point) cube([cubex, cubey, th],true);
     translate([m*sepx+gap-cube2,fingers[p],-dips[p]]) rotate_about_xy(rx*n-rx/2+0.5,0,rotation_point) cube([cubex, cubey, th],true);
     
     // to line
     translate([m*sepx-gap+cube2,fingers[0]-3,-dips[3]-frontdip]) rotate_about_xy(rx*n-rx/2,0,rotation_point) cube([cubex, 1, th],true);
     translate([m*sepx+gap-cube2,fingers[0]-3,-dips[3]-frontdip]) rotate_about_xy(rx*n-rx/2,0,rotation_point) cube([cubex, 1, th],true);
   }
    }
  }
 
  // join front of keys to back of thumb keys
  for(m = [4:5]) {
   color("dodgerblue")hull() {
   // from keys plate
     translate([m*sepx-gap,fingers[m],-dips[m]]) rotate_about_xy(rot2,0,rot_point2) rotate_about_xy(rx*n-rx/2,0,rotation_point) cube([cubex, cubey, th],true);
     translate([(m-1)*sepx+gap,fingers[m],-dips[m]]) rotate_about_xy(rot2,0,rot_point2) rotate_about_xy(rx*n-rx/2,0,rotation_point) cube([cubex, cubey, th],true);
   // to thumb
     translate([m*sepx-gap,-2*sepy+thumbs[m],0]) rotate_about_xy(rx+rx/2,0,rotation_point) cube([cubex, cubey, th],true);
     translate([(m-1)*sepx+gap,-2*sepy+thumbs[m],0]) rotate_about_xy(rx+rx/2,0,rotation_point) cube([cubex, cubey, th],true);
   }
  }
 
  // rear edge joining number row keys to rear border
  n2 = 3;
  for(m = [0:5]) {
   color("tomato")hull() {
     left=m==0?-edgex:0;
     right=m==5?edgex:0;
   // from plate
     translate([m*sepx-gap+right,fingers[m],-dips[m]]) rotate_about_xy(rot2,0,rot_point2)rotate_about_xy(rx*n2-rx/2,0,rotation_point) cube([cubex, cubey, th],true);
     translate([(m-1)*sepx+gap+left,fingers[m],-dips[m]]) rotate_about_xy(rot2,0,rot_point2)rotate_about_xy(rx*n2-rx/2,0,rotation_point) cube([cubex, cubey, th],true);
//   // to add thickness
     translate([m*sepx-gap+right,fingers[m],-dips[m]]) rotate_about_xy(rot2,0,rot_point2)rotate_about_xy(rx*n2-rx/2-0.5,0,rotation_point) cube([cubex, cubey, th],true);
     translate([(m-1)*sepx+gap+left,fingers[m],-dips[m]]) rotate_about_xy(rot2,0,rot_point2)rotate_about_xy(rx*n2-rx/2-0.5,0,rotation_point) cube([cubex, cubey, th],true);
   // to line
     translate([(m-1)*sepx+gap+left,fingers[3]+3,-dips[3]-reardip]) rotate_about_xy(rot2,0,rot_point2) rotate_about_xy(rx*n2-rx/2,0,rotation_point) cube([cubex, cubey, th],true);
     translate([m*sepx-gap+right,fingers[3]+3,-dips[3]-reardip]) rotate_about_xy(rot2,0,rot_point2) rotate_about_xy(rx*n2-rx/2,0,rotation_point) cube([cubex, cubey, th],true);
     
   }
    // extra rear bit that goes down to fixed baseline
   color("palegreen")hull() {
     left=m==0?-edgex:0;
     right=m==5?edgex:0;
     // top left
     translate([(m-1)*sepx+gap+left,fingers[3]+3,-dips[3]-reardip]) rotate_about_xy(rot2,0,rot_point2) rotate_about_xy(rx*n2-rx/2,0,rotation_point) cube([cubex, cubey, th],true);
     // top right
     translate([m*sepx-gap+right,fingers[3]+3,-dips[3]-reardip]) rotate_about_xy(rot2,0,rot_point2) rotate_about_xy(rx*n2-rx/2,0,rotation_point) cube([cubex, cubey, th],true);
     // bottom left
     translate([(m-1)*sepx+gap+left,reary,baseline]) cube([cubex, 1, th],true);
     // bottom right
     translate([m*sepx-gap+right,reary,baseline]) cube([cubex, 1, th],true);
   }
   if (m<5){
     // joiners between palegreen bits at the back
     color("darkseagreen")hull() {
     // top left
     translate([m*sepx+gap-cube2,fingers[3]+3,-dips[3]-reardip]) rotate_about_xy(rot2,0,rot_point2) rotate_about_xy(rx*n2-rx/2,0,rotation_point) cube([cubex, cubey, th],true);
     // top right
     translate([m*sepx-gap+cube2,fingers[3]+3,-dips[3]-reardip]) rotate_about_xy(rot2,0,rot_point2) rotate_about_xy(rx*n2-rx/2,0,rotation_point) cube([cubex, cubey, th],true);
     // bottom left
     translate([m*sepx+gap-cube2,reary,baseline]) cube([cubex, 1, th],true);
     // bottom right
     translate([m*sepx-gap+cube2,reary,baseline]) cube([cubex, 1, th],true);
     }
   }
  }
   
  // joiners between rear edge tomato bits
  for(m = [0:4]) {
    p = m + 1;
   color("teal")hull() {
     // right corner of plate
     translate([m*sepx-gap+cube2,fingers[m],-dips[m]]) rotate_about_xy(rot2,0,rot_point2) rotate_about_xy(rx*n2-rx/2,0,rotation_point) cube([cubex, cubey, th],true);
     // left side of front
     translate([m*sepx+gap-cube2,fingers[p],-dips[p]]) rotate_about_xy(rot2,0,rot_point2) rotate_about_xy(rx*n2-rx/2,0,rotation_point) cube([cubex, cubey, th],true);
     // right side of front
     translate([m*sepx-gap+cube2,fingers[3]+3,-dips[3]-reardip]) rotate_about_xy(rot2,0,rot_point2) rotate_about_xy(rx*n2-rx/2,0,rotation_point) cube([cubex, cubey, th],true);
     translate([m*sepx+gap-cube2,fingers[3]+3,-dips[3]-reardip]) rotate_about_xy(rot2,0,rot_point2) rotate_about_xy(rx*n2-rx/2,0,rotation_point) cube([cubex, cubey, th],true);
   }
  }
  for(m = [0:5]){
    // that sit on the left side of the key plates
    for(n=[2:2]) {
     left=m==0?-edgex:0;
     right=m==5?edgex:0;
      if(m>4)
      color("burlywood")hull() {
        // two bits on the underside of the keyboard plate
        translate([m*sepx-gap-vth+right,fingers[m],-dips[m]]) rotate_about_xy(rot2,0,rot_point2) rotate_about_xy_off(rx*n+rx/2,0,rotation_point,[0,0,-1]) cube([2*vth, cubey, th],true);
        // two vertices on the floor
        translate([m*sepx-gap-vth+right,supports[n+2],baseline])cube([2*vth, cubey, th],true);
        //
        translate([m*sepx-gap-vth+right,fingers[3]+3,-dips[3]-reardip]) rotate_about_xy(rot2,0,rot_point2) rotate_about_xy(rx*n2-rx/2,0,rotation_point) cube([2*vth, cubey, th],true);
      }
      if(m<1)
      color("burlywood")hull() {
        // two bits on the underside of the keyboard plate
        translate([(m-1)*sepx+gap+vth+left,fingers[m],-dips[m]]) rotate_about_xy(rot2,0,rot_point2) rotate_about_xy_off(rx*n+rx/2,0,rotation_point,[0,0,-1]) cube([2*vth, cubey, th],true);
        // two vertices on the floor
        translate([(m-1)*sepx+gap+vth+left,supports[n+2],baseline])cube([2*vth, cubey, th],true);
        //
        translate([(m-1)*sepx+gap+vth+left,fingers[3]+3,-dips[3]-reardip]) rotate_about_xy(rot2,0,rot_point2) rotate_about_xy(rx*n2-rx/2,0,rotation_point) cube([2*vth, cubey, th],true);
      }
    }
  }

} // end of union

  // take this stuff away from the rest
    union() {
      // square gap for caddy
      translate([10,17.2+58+1,-3.5+1.75-0.5]) cube([21,5,11],true); // elite-c
      // square gap for trrs jack
      translate([4.75*sepx-20,17.2+58+1,-3.5+1.75-0.5]) cube([11,5,11],true); // trrs jack
    }

  }
  // central support pillar
  hull() {
    translate([40,13.5,1])cube([2, 2, th],true);
    translate([40,13.5,baseline])cube([2, 2, th],true);
  }
  hull() {
    translate([55,13.5,1])cube([2, 2, th],true);
    translate([55,13.5,baseline])cube([2, 2, th],true);
  }
} // end of module

// bottom panel
//
module bottom() {
  difference() {
    color("lime")hull() {
      translate([-1*sepx+gap-edgex,fronty,baseline-bth/2-th/2]) cube([cubex, 1, bth],true);
      translate([6*sepx-gap+edgex,fronty,baseline-bth/2-th/2]) cube([cubex, 1, bth],true);
      translate([6*sepx-gap+edgex,reary,baseline-bth/2-th/2]) cube([cubex, 1, bth],true);
      translate([-1*sepx+gap-edgex,reary,baseline-bth/2-th/2]) cube([cubex, 1, bth],true);
    }
    translate([-sepx+4.9,fronty+4.2,baseline-bth-th/2]) cylinder(d1=screw,d2=3.1, h=bth,$fn=64);
//    translate([6*sepx-4.9,fronty+4.2,baseline-bth-th/2]) cylinder(d1=screw,d2=3.1, h=bth,$fn=64);
   
    translate([-sepx+4.9,reary-4.2,baseline-bth-th/2]) cylinder(d1=screw,d2=3.1, h=bth,$fn=64);
    translate([6*sepx-4.9,reary-4.2,baseline-bth-th/2]) cylinder(d1=screw,d2=3.1, h=bth,$fn=64);
   
    translate([1.5*sepx,fronty+4.3,baseline-bth-th/2]) cylinder(d1=screw,d2=3.1, h=bth,$fn=64);
    translate([3.5*sepx,reary-4.2,baseline-bth-th/2]) cylinder(d1=screw,d2=3.1, h=bth,$fn=64);
    translate([6*sepx-4.9,-5,baseline-bth-th/2]) cylinder(d1=screw,d2=3.1, h=bth,$fn=64);
    translate([-sepx+4.9,27,baseline-bth-th/2]) cylinder(d1=screw,d2=3.1, h=bth,$fn=64);
  }
 
}

module wristrest() {
  wth = 10;
  wdepth=100;
  cornerd=8;
  difference() {
    color("MediumVioletRed") hull() {
      translate([-1*sepx+gap-edgex,fronty,baseline+wth/2-bth-th/2]) cube([cubex, 1, wth],true);
      translate([6*sepx-gap+edgex,fronty,baseline+wth/2-bth-th/2]) cube([cubex, 1, wth],true);
      translate([6*sepx-gap+edgex,fronty-wdepth,baseline-bth]) cube([cubex, 1, th],true);
      translate([-1*sepx+gap-edgex,fronty-wdepth,baseline-bth]) cube([cubex, 1, th],true);
      translate([-1*sepx+gap-edgex+cornerd/2,fronty-wdepth+cornerd/2,baseline+wth-bth-th/2-cornerd/2]) sphere(d=cornerd,$fn=64);
      translate([6*sepx-gap+edgex-cornerd/2,fronty-wdepth+cornerd/2,baseline+wth-bth-th/2-cornerd/2]) sphere(d=cornerd,$fn=64);
    }
   
    top();
  }
}

module thumbcluster() {
    m=5;
    unit=5;
    //kw=18;
    //kd=18;
    // position cluster
    translate([m*sepx,fronty-7.1*unit,baseline-0.75])
    union() {
        // rotate it to extrude along z plane
        difference() {
            rotate(90)
            rotate_extrude(angle=-90)
            {
                // front wall
                translate([7.07*unit,0,0]) square([0.5*unit,1.3*unit],false);
                // back wall
                translate([11.13*unit,0,0]) square([0.5*unit,2.4*unit], false);
                // top wall
                rotate(15)    
                    translate([7.16*unit,-4]) square([4.7*unit,0.25*unit], false);
            };
            // thumb holes        
            translate([2.4*unit,8.9*unit,10]) rotate(-15) cube([kw,kd,10],true);
            translate([6.5*unit,6.5*unit,10]) rotate(-45) cube([kw,kd,10],true);
            translate([8.7*unit,2.5*unit,10]) rotate(-75) cube([kw,kd,10],true);
        }
        // endcap
        rotate([90]) linear_extrude(height=0.5)  polygon(points=[[7.07*unit,0], [7.07*unit,1.3*unit], [11.63*unit,2.55*unit], [11.63*unit,0]]);
    }
}

// add mirror for right hand
//mirror(v=[1,0,0])
difference() {
union() {
  union() {
    //top();
    //bolts();
  }
  //bottom();
  //m3screws();
  //wristrest();
  //  keycaps();
  //translate([10,58,0.2]) rotate([0,180,0]) elitec();
  //pro_micro_caddy();
 
  //translate([10,58,-0.8]) rotate([0,180,0]) elitec4();
  //caddy1_v4();
 
  jack_caddy(); // jack caddy
  //jack();
  //thumbcluster();
}
// hole to thethumcluster for wiring
translate([4.5*sepx, fronty+7, baseline]) cube([sepx,10,6], false);
}
